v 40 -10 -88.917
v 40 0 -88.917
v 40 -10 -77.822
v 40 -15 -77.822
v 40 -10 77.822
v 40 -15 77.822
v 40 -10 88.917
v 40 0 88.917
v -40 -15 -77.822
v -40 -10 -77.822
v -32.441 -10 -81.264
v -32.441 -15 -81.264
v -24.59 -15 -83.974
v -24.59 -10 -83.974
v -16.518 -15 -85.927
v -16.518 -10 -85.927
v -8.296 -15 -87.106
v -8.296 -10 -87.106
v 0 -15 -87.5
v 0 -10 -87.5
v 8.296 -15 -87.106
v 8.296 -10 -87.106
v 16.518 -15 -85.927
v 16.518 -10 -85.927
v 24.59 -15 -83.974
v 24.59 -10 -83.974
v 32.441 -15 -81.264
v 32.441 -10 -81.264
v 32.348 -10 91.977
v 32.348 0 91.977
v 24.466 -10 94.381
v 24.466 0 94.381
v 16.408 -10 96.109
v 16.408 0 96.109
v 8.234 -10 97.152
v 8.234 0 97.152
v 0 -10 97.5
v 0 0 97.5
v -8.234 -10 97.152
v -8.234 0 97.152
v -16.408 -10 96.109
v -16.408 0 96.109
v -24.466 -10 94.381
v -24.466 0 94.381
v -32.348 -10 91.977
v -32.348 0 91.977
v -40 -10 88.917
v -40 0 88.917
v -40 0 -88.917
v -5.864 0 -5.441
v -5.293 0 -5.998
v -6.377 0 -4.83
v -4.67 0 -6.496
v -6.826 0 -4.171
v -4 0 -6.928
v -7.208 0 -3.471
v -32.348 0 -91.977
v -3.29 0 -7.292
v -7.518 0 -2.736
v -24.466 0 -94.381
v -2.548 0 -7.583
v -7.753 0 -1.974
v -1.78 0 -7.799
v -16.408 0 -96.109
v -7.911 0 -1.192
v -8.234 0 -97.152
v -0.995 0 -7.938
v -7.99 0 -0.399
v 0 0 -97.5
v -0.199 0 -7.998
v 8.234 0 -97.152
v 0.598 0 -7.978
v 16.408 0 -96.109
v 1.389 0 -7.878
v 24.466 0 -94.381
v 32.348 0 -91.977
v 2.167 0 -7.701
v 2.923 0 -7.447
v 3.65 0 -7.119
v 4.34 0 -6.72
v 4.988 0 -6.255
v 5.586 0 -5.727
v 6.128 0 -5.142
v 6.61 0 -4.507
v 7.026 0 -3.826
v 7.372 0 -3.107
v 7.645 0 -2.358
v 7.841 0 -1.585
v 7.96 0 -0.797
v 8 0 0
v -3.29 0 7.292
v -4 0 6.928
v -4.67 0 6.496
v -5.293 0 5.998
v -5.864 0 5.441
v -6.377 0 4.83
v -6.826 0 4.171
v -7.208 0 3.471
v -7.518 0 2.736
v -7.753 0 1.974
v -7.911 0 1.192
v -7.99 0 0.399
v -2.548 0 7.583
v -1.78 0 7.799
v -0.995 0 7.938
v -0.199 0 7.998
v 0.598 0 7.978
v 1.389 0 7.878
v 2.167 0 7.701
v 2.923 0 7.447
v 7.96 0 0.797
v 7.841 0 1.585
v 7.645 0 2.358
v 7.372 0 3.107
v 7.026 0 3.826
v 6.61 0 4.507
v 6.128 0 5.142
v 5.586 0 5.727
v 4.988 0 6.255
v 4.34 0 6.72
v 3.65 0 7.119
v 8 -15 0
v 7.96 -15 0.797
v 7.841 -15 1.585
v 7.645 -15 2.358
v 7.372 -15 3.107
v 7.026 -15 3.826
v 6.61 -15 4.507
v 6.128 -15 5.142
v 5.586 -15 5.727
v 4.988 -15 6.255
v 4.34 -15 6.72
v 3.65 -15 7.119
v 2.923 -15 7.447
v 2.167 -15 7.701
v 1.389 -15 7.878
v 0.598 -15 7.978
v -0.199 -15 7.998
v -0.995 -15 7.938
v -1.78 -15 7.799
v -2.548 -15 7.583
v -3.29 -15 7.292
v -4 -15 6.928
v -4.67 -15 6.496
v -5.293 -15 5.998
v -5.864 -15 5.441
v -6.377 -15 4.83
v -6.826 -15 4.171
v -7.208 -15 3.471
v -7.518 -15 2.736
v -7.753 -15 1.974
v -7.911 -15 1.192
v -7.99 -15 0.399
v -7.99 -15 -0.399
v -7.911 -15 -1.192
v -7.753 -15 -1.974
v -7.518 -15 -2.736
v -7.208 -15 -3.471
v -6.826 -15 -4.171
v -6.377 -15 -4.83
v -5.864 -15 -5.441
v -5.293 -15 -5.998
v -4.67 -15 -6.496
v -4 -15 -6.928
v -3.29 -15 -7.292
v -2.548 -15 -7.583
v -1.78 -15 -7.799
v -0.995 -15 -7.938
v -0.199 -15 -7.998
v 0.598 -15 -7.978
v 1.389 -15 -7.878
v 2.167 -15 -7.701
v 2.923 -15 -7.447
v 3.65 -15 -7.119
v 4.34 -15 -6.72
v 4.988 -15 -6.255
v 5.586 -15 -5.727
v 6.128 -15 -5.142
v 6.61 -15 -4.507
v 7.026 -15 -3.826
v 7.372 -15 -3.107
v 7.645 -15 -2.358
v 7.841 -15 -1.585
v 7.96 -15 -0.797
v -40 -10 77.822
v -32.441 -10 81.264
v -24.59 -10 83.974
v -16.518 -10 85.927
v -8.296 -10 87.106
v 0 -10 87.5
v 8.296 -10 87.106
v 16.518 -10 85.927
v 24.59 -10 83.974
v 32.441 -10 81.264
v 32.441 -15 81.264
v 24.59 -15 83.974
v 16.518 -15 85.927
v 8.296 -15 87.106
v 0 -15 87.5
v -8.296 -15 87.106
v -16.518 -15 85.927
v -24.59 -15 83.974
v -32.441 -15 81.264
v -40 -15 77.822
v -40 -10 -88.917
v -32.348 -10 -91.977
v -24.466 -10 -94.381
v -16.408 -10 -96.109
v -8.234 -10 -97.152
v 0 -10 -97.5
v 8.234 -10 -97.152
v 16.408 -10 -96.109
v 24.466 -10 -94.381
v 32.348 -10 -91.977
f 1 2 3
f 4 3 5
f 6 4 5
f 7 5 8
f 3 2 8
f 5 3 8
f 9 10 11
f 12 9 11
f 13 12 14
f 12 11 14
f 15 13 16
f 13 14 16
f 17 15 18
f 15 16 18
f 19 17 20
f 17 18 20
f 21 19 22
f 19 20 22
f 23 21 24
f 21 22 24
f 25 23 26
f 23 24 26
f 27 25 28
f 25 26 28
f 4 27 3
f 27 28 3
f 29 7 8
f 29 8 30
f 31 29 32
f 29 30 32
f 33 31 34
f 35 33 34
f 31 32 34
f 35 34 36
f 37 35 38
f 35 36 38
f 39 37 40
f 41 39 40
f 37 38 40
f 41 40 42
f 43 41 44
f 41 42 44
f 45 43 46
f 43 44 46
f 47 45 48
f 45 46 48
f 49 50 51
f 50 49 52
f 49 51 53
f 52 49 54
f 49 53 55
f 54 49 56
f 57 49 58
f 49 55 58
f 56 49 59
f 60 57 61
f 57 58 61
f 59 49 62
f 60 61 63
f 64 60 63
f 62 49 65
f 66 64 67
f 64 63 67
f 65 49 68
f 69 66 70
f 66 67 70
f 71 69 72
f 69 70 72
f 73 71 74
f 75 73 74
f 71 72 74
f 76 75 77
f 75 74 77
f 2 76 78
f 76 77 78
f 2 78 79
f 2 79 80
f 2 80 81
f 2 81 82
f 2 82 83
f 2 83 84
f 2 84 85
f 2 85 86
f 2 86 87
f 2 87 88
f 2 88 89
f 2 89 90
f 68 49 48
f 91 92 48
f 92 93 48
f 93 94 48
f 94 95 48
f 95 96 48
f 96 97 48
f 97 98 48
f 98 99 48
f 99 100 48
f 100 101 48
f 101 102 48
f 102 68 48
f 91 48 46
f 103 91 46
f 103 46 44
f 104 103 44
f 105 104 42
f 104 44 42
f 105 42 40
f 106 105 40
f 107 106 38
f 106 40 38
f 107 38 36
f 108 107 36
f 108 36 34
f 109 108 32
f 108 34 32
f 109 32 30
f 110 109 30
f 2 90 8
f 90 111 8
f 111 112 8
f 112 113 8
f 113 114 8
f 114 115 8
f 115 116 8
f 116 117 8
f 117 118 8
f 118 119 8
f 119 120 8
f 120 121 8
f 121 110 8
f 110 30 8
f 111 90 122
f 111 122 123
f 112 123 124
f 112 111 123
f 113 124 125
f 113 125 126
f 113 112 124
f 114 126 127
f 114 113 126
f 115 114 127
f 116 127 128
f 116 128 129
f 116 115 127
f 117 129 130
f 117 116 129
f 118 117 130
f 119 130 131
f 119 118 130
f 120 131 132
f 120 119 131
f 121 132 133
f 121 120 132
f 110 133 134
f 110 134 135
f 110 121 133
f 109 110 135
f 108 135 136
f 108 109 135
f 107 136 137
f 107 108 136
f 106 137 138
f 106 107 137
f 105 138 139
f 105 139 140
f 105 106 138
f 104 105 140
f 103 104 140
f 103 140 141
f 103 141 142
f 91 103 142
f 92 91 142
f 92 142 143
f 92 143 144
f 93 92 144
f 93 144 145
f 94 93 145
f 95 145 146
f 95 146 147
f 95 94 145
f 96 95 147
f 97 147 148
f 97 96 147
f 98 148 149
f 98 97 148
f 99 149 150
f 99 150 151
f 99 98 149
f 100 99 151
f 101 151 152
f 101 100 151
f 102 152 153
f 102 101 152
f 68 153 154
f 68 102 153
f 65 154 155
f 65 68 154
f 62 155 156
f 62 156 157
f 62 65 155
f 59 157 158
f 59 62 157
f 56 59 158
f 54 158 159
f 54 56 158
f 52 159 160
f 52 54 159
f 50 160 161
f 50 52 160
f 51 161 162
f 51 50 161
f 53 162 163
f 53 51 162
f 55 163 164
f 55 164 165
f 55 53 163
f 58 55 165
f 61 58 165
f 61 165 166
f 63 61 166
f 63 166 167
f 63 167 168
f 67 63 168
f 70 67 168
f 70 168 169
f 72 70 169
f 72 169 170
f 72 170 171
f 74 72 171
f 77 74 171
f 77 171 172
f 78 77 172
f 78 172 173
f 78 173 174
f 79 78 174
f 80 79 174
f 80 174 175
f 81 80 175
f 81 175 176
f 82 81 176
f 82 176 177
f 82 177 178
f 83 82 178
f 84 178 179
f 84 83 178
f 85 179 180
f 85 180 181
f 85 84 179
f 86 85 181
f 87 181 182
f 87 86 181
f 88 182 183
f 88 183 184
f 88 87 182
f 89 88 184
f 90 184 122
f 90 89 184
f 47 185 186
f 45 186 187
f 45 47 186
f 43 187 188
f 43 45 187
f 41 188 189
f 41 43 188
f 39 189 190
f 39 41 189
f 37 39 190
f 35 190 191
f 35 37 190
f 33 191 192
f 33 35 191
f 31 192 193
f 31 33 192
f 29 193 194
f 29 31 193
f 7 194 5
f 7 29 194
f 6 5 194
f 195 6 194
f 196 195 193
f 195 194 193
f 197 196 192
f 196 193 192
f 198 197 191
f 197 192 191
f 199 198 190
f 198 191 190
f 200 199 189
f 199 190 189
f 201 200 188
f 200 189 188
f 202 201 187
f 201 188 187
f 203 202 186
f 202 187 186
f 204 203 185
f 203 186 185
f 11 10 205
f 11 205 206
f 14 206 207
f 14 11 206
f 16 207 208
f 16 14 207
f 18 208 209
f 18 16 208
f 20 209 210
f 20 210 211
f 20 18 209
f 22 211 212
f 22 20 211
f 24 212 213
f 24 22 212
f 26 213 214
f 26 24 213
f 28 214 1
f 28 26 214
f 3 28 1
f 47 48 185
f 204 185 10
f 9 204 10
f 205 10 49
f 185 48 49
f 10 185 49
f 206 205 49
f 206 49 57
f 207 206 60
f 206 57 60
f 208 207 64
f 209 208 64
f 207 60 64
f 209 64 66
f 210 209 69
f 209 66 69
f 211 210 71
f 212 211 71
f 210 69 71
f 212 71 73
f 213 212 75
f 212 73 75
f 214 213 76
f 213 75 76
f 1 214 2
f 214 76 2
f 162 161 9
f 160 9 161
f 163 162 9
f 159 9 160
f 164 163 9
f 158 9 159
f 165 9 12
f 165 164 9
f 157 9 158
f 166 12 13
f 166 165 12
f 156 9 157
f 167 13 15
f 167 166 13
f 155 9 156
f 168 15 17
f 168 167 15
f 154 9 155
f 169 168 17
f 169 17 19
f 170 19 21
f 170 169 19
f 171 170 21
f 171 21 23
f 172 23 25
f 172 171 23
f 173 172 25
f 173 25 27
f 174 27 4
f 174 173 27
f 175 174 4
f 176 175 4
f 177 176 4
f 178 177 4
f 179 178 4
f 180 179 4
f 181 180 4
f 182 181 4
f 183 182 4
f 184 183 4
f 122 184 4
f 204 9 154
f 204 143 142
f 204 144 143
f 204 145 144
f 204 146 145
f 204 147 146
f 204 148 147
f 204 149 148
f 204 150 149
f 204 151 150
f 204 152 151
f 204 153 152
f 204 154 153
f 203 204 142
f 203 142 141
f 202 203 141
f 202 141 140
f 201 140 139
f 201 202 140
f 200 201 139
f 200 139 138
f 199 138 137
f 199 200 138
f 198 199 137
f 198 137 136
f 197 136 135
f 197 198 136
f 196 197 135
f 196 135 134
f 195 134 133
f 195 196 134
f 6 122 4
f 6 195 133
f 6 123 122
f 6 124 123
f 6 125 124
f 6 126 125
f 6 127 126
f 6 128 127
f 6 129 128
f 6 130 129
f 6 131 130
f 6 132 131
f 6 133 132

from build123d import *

# Parameters (mm, degrees)
F0_R     = 8
F1_DEPTH = 15
F2_DEPTH = 10


with BuildPart() as f1:
    # F0 (on Front) → F1 (new body)
    with BuildSketch(Plane.XZ):
        with BuildLine():
            Line((40, -77.8219120814), (40, 77.8219120814))
            ThreePointArc((40, 77.8219120814), (0, 87.5), (-40, 77.8219120814))
            Line((-40, 77.8219120814), (-40, -77.8219120814))
            ThreePointArc((-40, -77.8219120814), (0, -87.5), (40, -77.8219120814))
        make_face()
        Circle(F0_R, mode=Mode.SUBTRACT)
    extrude(amount=F1_DEPTH)

    # F0 (on Front) → F2 (join)
    with BuildSketch(Plane.XZ):
        with BuildLine():
            ThreePointArc((-40, 77.8219120814), (0, 87.5), (40, 77.8219120814))
            Line((40, 77.8219120814), (40, 88.9170962189))
            ThreePointArc((40, 88.9170962189), (0, 97.5), (-40, 88.9170962189))
            Line((-40, 88.9170962189), (-40, 77.8219120814))
        make_face()
        with BuildLine():
            Line((40, -88.9170962189), (40, -77.8219120814))
            ThreePointArc((40, -77.8219120814), (0, -87.5), (-40, -77.8219120814))
            Line((-40, -77.8219120814), (-40, -88.9170962189))
            ThreePointArc((-40, -88.9170962189), (0, -97.5), (40, -88.9170962189))
        make_face()
    extrude(amount=F2_DEPTH)


solid = f1.part
